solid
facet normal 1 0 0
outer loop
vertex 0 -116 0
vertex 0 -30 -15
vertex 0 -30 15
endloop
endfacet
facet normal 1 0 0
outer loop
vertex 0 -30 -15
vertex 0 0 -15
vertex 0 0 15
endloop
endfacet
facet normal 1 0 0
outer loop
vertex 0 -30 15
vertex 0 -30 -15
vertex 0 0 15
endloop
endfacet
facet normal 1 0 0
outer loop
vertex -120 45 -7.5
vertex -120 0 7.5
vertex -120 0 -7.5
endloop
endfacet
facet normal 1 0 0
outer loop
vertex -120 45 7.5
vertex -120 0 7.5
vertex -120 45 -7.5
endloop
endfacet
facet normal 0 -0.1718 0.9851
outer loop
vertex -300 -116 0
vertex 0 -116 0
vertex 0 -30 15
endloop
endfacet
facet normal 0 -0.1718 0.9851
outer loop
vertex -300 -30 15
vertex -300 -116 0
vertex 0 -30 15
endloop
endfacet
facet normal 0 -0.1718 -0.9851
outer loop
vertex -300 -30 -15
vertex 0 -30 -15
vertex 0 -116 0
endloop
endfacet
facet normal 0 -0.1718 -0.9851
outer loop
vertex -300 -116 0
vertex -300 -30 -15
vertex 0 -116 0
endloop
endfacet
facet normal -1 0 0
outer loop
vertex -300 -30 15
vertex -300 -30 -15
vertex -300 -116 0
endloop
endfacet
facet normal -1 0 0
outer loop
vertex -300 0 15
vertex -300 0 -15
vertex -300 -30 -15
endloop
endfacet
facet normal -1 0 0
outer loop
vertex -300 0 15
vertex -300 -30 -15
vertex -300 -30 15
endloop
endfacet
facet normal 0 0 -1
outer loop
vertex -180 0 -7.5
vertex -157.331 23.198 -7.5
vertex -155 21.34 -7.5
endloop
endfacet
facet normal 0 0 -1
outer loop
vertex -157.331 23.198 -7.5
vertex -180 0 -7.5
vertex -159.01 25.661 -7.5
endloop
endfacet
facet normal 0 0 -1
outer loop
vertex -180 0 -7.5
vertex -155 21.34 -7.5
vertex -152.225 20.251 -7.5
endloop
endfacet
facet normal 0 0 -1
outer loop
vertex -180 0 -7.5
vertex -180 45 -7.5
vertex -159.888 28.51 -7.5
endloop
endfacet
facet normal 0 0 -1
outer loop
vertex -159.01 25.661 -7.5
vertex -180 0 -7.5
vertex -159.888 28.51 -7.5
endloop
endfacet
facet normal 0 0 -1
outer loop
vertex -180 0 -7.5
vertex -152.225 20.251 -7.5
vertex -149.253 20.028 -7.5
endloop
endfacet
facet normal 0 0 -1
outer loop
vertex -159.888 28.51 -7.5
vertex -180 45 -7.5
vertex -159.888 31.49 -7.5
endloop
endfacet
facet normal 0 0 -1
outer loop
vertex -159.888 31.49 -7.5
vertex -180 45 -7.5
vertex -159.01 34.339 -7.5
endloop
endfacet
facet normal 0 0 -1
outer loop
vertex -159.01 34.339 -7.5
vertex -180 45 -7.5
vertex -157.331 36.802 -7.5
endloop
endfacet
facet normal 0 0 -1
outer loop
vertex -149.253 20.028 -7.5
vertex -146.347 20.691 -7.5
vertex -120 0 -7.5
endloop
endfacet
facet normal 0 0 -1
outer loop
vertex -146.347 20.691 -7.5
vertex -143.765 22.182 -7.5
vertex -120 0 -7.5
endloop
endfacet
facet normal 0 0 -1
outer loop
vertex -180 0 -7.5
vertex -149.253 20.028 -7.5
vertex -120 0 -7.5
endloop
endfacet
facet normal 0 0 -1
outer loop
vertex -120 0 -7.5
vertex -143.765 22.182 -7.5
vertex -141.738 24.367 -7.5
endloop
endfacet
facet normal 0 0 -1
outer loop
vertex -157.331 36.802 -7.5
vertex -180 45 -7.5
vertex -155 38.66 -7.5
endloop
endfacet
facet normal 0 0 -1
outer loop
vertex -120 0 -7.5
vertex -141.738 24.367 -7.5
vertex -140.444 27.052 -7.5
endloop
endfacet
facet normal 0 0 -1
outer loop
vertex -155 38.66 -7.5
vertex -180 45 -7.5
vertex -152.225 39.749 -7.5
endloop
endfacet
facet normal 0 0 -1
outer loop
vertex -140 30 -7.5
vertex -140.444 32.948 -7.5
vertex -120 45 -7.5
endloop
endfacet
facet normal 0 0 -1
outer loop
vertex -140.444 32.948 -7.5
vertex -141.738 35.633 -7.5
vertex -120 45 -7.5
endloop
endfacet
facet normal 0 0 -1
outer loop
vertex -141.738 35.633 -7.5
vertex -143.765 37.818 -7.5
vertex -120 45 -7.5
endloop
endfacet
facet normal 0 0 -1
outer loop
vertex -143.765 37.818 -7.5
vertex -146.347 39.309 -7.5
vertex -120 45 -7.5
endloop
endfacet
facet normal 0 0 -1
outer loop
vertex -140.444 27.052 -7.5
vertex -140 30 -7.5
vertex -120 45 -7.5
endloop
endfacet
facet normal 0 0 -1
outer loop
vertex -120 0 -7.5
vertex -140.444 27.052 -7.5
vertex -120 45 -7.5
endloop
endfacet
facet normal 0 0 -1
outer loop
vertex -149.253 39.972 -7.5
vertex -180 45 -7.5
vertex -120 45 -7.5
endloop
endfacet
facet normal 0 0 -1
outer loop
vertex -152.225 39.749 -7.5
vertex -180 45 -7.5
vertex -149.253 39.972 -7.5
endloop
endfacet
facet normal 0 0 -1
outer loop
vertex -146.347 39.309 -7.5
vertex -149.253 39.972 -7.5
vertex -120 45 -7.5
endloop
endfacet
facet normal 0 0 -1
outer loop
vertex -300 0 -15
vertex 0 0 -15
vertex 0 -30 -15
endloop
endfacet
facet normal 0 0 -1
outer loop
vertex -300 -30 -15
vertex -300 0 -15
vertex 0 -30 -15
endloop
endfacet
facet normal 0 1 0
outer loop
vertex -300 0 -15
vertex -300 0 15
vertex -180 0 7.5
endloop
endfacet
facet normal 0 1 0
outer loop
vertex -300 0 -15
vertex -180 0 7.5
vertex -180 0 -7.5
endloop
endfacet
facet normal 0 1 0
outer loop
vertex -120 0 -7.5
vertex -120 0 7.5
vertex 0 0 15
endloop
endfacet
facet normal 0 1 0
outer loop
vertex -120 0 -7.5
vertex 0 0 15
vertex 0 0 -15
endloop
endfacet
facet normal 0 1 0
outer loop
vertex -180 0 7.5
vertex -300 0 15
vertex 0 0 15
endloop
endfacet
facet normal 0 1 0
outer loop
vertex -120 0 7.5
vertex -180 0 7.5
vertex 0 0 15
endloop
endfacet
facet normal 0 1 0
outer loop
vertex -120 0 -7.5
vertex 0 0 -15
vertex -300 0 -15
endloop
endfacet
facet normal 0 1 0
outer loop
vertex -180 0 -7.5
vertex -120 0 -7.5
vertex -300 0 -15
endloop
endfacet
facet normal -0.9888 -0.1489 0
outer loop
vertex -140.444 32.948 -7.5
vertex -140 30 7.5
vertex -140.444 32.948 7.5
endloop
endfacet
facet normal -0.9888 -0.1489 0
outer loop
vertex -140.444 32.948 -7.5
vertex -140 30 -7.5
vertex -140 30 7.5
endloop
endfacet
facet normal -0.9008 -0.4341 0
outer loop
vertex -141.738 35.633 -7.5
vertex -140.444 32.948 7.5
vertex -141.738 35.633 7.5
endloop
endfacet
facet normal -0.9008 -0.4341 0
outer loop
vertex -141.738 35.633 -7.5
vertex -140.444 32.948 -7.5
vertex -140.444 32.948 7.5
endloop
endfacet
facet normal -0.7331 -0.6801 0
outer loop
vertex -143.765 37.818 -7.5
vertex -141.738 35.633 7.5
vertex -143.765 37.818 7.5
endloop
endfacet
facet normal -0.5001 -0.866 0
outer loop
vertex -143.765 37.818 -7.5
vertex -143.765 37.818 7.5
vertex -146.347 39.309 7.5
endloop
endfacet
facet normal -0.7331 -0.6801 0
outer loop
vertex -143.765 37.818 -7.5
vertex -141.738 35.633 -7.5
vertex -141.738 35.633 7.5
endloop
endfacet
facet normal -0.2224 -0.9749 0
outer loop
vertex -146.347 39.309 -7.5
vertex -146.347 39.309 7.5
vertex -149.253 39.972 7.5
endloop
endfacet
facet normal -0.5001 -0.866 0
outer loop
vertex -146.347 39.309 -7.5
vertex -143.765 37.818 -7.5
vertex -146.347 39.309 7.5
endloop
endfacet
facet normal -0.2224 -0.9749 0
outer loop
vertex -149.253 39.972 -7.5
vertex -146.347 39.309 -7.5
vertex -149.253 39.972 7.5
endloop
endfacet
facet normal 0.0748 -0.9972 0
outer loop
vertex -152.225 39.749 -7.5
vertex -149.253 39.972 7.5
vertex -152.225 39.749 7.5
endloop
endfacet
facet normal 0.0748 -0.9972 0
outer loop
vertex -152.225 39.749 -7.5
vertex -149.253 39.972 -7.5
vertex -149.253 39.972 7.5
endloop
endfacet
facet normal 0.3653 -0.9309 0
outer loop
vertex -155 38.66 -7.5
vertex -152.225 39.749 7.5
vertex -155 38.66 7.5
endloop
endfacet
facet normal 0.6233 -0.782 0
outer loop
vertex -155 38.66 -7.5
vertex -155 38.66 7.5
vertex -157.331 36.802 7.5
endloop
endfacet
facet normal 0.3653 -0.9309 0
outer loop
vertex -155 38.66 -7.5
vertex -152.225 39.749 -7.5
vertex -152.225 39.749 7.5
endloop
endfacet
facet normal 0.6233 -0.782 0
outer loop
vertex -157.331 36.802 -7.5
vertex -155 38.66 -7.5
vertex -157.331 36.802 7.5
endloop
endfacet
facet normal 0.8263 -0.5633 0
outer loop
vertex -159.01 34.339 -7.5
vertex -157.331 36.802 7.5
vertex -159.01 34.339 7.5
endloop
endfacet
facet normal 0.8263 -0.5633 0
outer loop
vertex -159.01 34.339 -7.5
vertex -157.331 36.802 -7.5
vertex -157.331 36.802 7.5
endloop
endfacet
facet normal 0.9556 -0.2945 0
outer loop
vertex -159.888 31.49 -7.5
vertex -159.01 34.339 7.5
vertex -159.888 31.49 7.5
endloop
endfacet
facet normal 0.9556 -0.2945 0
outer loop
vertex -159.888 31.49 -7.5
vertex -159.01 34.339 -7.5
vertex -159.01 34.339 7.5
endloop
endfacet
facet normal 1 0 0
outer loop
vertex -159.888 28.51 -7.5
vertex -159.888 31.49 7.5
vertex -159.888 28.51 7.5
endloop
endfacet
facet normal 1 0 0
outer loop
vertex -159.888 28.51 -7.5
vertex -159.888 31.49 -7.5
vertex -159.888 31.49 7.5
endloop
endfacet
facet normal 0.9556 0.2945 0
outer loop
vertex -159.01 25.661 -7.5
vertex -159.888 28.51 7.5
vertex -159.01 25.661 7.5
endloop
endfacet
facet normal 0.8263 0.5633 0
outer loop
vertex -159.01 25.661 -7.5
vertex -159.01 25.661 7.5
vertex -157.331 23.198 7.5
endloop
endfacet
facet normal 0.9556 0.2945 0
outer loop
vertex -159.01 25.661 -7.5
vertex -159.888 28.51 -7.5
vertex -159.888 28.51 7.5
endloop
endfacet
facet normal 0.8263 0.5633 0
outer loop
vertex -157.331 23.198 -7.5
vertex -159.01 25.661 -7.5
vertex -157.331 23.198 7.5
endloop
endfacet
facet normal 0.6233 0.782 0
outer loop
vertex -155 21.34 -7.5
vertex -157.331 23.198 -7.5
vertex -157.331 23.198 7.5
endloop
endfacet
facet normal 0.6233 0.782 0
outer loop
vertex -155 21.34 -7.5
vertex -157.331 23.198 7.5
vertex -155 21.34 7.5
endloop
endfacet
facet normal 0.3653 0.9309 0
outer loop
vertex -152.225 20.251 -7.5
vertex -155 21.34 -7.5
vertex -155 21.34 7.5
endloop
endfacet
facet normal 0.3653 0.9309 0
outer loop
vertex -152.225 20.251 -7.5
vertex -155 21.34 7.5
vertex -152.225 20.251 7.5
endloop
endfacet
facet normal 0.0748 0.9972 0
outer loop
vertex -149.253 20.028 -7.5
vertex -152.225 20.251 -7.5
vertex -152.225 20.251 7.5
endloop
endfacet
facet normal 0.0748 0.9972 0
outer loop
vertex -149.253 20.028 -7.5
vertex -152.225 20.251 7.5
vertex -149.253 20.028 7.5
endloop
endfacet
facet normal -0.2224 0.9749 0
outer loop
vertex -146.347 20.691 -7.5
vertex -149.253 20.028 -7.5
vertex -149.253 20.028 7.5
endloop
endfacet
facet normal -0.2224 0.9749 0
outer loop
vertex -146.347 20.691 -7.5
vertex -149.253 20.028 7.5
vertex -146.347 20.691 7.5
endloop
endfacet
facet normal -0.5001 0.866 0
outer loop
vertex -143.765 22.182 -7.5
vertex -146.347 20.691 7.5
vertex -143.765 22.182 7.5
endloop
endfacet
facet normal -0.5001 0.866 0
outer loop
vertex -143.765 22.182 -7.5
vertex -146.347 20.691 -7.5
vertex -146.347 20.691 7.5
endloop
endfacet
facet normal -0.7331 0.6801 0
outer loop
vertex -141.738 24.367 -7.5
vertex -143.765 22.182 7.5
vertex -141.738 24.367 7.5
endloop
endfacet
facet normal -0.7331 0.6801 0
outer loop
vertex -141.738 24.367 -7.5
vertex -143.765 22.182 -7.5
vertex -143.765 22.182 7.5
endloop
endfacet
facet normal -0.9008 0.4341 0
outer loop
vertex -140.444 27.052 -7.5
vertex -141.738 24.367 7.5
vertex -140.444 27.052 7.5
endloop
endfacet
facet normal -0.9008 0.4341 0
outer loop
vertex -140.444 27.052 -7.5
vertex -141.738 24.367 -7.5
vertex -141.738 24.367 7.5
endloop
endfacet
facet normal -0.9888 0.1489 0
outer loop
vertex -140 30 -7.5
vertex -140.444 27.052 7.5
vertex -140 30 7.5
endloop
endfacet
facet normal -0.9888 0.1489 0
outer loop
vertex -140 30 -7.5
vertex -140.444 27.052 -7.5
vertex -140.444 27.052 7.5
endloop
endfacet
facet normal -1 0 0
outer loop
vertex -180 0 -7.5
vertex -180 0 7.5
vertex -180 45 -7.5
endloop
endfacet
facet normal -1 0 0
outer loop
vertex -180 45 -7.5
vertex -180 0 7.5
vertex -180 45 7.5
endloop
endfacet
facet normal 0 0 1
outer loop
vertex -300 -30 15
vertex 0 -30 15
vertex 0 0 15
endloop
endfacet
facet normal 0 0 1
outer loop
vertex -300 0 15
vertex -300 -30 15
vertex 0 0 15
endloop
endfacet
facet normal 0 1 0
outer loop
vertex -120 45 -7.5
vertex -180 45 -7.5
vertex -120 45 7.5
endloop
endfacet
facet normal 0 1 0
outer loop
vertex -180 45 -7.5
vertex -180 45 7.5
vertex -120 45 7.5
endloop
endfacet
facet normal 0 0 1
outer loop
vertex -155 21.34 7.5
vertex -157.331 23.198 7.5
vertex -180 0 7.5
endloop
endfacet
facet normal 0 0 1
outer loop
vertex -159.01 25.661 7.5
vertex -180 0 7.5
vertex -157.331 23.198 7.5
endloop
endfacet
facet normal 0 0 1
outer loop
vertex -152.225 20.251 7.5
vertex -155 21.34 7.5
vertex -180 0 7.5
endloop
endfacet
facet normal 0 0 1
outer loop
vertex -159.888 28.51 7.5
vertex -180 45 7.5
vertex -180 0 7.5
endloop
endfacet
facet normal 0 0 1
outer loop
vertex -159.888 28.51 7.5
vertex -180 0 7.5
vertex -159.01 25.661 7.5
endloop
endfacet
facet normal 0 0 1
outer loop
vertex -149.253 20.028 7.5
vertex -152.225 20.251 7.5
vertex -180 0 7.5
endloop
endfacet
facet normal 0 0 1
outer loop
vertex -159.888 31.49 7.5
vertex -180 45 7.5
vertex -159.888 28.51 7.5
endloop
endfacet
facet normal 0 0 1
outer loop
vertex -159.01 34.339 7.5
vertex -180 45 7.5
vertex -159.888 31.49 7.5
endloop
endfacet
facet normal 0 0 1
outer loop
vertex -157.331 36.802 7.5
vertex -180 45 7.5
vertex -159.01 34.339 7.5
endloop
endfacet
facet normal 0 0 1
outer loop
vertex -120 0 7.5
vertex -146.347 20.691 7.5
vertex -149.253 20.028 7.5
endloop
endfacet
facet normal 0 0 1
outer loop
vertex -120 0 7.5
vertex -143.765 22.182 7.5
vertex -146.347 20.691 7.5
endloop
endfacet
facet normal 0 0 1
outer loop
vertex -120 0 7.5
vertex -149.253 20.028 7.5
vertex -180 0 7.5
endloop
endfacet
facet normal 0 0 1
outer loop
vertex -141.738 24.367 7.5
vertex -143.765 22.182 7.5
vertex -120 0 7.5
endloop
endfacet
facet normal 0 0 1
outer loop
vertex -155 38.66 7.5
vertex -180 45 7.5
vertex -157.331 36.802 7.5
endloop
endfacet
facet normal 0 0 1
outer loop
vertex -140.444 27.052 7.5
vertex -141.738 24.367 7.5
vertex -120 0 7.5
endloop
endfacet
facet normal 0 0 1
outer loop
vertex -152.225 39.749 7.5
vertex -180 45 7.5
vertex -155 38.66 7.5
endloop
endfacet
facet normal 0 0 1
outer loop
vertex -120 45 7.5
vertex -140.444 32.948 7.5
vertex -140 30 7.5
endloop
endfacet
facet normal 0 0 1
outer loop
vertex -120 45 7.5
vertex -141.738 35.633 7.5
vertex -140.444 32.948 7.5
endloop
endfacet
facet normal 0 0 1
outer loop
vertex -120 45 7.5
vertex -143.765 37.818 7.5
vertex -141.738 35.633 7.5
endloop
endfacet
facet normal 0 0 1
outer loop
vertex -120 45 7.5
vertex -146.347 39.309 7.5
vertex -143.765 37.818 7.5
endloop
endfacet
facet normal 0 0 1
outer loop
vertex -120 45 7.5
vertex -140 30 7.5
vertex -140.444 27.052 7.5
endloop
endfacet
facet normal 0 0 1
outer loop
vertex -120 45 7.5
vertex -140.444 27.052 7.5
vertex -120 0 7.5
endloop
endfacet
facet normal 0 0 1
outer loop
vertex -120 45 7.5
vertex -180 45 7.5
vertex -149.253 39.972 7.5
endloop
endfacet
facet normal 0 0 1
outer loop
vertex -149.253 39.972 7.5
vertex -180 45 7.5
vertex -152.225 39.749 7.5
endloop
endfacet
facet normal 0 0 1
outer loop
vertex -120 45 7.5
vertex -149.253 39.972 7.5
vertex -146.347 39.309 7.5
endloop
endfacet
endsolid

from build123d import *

# Parameters (mm, degrees)
BOSS_EXTRUDE1_DEPTH = 300
SKETCH2_W           = 60
SKETCH2_H           = 45
SKETCH2_R           = 10
BOSS_EXTRUDE2_DEPTH = 7.5


with BuildPart() as part:
    # Sketch1 → Boss-Extrude1 (new body)
    with BuildSketch(Plane(origin=(0, 0, 0), x_dir=(0, 0, -1), z_dir=(1, 0, 0))):
        Polygon((-15, 0), (15, 0), (15, -30), (0, -116), (-15, -30), align=None)
    extrude(amount=-BOSS_EXTRUDE1_DEPTH)

    # Sketch2 → Boss-Extrude2 (add, symmetric)
    with BuildSketch(Plane.XY):
        with Locations((-150, 22.5)):
            Rectangle(SKETCH2_W, SKETCH2_H)
        with Locations((-150, 30)):
            Circle(SKETCH2_R, mode=Mode.SUBTRACT)
    extrude(amount=BOSS_EXTRUDE2_DEPTH, both=True)


solid = part.part
